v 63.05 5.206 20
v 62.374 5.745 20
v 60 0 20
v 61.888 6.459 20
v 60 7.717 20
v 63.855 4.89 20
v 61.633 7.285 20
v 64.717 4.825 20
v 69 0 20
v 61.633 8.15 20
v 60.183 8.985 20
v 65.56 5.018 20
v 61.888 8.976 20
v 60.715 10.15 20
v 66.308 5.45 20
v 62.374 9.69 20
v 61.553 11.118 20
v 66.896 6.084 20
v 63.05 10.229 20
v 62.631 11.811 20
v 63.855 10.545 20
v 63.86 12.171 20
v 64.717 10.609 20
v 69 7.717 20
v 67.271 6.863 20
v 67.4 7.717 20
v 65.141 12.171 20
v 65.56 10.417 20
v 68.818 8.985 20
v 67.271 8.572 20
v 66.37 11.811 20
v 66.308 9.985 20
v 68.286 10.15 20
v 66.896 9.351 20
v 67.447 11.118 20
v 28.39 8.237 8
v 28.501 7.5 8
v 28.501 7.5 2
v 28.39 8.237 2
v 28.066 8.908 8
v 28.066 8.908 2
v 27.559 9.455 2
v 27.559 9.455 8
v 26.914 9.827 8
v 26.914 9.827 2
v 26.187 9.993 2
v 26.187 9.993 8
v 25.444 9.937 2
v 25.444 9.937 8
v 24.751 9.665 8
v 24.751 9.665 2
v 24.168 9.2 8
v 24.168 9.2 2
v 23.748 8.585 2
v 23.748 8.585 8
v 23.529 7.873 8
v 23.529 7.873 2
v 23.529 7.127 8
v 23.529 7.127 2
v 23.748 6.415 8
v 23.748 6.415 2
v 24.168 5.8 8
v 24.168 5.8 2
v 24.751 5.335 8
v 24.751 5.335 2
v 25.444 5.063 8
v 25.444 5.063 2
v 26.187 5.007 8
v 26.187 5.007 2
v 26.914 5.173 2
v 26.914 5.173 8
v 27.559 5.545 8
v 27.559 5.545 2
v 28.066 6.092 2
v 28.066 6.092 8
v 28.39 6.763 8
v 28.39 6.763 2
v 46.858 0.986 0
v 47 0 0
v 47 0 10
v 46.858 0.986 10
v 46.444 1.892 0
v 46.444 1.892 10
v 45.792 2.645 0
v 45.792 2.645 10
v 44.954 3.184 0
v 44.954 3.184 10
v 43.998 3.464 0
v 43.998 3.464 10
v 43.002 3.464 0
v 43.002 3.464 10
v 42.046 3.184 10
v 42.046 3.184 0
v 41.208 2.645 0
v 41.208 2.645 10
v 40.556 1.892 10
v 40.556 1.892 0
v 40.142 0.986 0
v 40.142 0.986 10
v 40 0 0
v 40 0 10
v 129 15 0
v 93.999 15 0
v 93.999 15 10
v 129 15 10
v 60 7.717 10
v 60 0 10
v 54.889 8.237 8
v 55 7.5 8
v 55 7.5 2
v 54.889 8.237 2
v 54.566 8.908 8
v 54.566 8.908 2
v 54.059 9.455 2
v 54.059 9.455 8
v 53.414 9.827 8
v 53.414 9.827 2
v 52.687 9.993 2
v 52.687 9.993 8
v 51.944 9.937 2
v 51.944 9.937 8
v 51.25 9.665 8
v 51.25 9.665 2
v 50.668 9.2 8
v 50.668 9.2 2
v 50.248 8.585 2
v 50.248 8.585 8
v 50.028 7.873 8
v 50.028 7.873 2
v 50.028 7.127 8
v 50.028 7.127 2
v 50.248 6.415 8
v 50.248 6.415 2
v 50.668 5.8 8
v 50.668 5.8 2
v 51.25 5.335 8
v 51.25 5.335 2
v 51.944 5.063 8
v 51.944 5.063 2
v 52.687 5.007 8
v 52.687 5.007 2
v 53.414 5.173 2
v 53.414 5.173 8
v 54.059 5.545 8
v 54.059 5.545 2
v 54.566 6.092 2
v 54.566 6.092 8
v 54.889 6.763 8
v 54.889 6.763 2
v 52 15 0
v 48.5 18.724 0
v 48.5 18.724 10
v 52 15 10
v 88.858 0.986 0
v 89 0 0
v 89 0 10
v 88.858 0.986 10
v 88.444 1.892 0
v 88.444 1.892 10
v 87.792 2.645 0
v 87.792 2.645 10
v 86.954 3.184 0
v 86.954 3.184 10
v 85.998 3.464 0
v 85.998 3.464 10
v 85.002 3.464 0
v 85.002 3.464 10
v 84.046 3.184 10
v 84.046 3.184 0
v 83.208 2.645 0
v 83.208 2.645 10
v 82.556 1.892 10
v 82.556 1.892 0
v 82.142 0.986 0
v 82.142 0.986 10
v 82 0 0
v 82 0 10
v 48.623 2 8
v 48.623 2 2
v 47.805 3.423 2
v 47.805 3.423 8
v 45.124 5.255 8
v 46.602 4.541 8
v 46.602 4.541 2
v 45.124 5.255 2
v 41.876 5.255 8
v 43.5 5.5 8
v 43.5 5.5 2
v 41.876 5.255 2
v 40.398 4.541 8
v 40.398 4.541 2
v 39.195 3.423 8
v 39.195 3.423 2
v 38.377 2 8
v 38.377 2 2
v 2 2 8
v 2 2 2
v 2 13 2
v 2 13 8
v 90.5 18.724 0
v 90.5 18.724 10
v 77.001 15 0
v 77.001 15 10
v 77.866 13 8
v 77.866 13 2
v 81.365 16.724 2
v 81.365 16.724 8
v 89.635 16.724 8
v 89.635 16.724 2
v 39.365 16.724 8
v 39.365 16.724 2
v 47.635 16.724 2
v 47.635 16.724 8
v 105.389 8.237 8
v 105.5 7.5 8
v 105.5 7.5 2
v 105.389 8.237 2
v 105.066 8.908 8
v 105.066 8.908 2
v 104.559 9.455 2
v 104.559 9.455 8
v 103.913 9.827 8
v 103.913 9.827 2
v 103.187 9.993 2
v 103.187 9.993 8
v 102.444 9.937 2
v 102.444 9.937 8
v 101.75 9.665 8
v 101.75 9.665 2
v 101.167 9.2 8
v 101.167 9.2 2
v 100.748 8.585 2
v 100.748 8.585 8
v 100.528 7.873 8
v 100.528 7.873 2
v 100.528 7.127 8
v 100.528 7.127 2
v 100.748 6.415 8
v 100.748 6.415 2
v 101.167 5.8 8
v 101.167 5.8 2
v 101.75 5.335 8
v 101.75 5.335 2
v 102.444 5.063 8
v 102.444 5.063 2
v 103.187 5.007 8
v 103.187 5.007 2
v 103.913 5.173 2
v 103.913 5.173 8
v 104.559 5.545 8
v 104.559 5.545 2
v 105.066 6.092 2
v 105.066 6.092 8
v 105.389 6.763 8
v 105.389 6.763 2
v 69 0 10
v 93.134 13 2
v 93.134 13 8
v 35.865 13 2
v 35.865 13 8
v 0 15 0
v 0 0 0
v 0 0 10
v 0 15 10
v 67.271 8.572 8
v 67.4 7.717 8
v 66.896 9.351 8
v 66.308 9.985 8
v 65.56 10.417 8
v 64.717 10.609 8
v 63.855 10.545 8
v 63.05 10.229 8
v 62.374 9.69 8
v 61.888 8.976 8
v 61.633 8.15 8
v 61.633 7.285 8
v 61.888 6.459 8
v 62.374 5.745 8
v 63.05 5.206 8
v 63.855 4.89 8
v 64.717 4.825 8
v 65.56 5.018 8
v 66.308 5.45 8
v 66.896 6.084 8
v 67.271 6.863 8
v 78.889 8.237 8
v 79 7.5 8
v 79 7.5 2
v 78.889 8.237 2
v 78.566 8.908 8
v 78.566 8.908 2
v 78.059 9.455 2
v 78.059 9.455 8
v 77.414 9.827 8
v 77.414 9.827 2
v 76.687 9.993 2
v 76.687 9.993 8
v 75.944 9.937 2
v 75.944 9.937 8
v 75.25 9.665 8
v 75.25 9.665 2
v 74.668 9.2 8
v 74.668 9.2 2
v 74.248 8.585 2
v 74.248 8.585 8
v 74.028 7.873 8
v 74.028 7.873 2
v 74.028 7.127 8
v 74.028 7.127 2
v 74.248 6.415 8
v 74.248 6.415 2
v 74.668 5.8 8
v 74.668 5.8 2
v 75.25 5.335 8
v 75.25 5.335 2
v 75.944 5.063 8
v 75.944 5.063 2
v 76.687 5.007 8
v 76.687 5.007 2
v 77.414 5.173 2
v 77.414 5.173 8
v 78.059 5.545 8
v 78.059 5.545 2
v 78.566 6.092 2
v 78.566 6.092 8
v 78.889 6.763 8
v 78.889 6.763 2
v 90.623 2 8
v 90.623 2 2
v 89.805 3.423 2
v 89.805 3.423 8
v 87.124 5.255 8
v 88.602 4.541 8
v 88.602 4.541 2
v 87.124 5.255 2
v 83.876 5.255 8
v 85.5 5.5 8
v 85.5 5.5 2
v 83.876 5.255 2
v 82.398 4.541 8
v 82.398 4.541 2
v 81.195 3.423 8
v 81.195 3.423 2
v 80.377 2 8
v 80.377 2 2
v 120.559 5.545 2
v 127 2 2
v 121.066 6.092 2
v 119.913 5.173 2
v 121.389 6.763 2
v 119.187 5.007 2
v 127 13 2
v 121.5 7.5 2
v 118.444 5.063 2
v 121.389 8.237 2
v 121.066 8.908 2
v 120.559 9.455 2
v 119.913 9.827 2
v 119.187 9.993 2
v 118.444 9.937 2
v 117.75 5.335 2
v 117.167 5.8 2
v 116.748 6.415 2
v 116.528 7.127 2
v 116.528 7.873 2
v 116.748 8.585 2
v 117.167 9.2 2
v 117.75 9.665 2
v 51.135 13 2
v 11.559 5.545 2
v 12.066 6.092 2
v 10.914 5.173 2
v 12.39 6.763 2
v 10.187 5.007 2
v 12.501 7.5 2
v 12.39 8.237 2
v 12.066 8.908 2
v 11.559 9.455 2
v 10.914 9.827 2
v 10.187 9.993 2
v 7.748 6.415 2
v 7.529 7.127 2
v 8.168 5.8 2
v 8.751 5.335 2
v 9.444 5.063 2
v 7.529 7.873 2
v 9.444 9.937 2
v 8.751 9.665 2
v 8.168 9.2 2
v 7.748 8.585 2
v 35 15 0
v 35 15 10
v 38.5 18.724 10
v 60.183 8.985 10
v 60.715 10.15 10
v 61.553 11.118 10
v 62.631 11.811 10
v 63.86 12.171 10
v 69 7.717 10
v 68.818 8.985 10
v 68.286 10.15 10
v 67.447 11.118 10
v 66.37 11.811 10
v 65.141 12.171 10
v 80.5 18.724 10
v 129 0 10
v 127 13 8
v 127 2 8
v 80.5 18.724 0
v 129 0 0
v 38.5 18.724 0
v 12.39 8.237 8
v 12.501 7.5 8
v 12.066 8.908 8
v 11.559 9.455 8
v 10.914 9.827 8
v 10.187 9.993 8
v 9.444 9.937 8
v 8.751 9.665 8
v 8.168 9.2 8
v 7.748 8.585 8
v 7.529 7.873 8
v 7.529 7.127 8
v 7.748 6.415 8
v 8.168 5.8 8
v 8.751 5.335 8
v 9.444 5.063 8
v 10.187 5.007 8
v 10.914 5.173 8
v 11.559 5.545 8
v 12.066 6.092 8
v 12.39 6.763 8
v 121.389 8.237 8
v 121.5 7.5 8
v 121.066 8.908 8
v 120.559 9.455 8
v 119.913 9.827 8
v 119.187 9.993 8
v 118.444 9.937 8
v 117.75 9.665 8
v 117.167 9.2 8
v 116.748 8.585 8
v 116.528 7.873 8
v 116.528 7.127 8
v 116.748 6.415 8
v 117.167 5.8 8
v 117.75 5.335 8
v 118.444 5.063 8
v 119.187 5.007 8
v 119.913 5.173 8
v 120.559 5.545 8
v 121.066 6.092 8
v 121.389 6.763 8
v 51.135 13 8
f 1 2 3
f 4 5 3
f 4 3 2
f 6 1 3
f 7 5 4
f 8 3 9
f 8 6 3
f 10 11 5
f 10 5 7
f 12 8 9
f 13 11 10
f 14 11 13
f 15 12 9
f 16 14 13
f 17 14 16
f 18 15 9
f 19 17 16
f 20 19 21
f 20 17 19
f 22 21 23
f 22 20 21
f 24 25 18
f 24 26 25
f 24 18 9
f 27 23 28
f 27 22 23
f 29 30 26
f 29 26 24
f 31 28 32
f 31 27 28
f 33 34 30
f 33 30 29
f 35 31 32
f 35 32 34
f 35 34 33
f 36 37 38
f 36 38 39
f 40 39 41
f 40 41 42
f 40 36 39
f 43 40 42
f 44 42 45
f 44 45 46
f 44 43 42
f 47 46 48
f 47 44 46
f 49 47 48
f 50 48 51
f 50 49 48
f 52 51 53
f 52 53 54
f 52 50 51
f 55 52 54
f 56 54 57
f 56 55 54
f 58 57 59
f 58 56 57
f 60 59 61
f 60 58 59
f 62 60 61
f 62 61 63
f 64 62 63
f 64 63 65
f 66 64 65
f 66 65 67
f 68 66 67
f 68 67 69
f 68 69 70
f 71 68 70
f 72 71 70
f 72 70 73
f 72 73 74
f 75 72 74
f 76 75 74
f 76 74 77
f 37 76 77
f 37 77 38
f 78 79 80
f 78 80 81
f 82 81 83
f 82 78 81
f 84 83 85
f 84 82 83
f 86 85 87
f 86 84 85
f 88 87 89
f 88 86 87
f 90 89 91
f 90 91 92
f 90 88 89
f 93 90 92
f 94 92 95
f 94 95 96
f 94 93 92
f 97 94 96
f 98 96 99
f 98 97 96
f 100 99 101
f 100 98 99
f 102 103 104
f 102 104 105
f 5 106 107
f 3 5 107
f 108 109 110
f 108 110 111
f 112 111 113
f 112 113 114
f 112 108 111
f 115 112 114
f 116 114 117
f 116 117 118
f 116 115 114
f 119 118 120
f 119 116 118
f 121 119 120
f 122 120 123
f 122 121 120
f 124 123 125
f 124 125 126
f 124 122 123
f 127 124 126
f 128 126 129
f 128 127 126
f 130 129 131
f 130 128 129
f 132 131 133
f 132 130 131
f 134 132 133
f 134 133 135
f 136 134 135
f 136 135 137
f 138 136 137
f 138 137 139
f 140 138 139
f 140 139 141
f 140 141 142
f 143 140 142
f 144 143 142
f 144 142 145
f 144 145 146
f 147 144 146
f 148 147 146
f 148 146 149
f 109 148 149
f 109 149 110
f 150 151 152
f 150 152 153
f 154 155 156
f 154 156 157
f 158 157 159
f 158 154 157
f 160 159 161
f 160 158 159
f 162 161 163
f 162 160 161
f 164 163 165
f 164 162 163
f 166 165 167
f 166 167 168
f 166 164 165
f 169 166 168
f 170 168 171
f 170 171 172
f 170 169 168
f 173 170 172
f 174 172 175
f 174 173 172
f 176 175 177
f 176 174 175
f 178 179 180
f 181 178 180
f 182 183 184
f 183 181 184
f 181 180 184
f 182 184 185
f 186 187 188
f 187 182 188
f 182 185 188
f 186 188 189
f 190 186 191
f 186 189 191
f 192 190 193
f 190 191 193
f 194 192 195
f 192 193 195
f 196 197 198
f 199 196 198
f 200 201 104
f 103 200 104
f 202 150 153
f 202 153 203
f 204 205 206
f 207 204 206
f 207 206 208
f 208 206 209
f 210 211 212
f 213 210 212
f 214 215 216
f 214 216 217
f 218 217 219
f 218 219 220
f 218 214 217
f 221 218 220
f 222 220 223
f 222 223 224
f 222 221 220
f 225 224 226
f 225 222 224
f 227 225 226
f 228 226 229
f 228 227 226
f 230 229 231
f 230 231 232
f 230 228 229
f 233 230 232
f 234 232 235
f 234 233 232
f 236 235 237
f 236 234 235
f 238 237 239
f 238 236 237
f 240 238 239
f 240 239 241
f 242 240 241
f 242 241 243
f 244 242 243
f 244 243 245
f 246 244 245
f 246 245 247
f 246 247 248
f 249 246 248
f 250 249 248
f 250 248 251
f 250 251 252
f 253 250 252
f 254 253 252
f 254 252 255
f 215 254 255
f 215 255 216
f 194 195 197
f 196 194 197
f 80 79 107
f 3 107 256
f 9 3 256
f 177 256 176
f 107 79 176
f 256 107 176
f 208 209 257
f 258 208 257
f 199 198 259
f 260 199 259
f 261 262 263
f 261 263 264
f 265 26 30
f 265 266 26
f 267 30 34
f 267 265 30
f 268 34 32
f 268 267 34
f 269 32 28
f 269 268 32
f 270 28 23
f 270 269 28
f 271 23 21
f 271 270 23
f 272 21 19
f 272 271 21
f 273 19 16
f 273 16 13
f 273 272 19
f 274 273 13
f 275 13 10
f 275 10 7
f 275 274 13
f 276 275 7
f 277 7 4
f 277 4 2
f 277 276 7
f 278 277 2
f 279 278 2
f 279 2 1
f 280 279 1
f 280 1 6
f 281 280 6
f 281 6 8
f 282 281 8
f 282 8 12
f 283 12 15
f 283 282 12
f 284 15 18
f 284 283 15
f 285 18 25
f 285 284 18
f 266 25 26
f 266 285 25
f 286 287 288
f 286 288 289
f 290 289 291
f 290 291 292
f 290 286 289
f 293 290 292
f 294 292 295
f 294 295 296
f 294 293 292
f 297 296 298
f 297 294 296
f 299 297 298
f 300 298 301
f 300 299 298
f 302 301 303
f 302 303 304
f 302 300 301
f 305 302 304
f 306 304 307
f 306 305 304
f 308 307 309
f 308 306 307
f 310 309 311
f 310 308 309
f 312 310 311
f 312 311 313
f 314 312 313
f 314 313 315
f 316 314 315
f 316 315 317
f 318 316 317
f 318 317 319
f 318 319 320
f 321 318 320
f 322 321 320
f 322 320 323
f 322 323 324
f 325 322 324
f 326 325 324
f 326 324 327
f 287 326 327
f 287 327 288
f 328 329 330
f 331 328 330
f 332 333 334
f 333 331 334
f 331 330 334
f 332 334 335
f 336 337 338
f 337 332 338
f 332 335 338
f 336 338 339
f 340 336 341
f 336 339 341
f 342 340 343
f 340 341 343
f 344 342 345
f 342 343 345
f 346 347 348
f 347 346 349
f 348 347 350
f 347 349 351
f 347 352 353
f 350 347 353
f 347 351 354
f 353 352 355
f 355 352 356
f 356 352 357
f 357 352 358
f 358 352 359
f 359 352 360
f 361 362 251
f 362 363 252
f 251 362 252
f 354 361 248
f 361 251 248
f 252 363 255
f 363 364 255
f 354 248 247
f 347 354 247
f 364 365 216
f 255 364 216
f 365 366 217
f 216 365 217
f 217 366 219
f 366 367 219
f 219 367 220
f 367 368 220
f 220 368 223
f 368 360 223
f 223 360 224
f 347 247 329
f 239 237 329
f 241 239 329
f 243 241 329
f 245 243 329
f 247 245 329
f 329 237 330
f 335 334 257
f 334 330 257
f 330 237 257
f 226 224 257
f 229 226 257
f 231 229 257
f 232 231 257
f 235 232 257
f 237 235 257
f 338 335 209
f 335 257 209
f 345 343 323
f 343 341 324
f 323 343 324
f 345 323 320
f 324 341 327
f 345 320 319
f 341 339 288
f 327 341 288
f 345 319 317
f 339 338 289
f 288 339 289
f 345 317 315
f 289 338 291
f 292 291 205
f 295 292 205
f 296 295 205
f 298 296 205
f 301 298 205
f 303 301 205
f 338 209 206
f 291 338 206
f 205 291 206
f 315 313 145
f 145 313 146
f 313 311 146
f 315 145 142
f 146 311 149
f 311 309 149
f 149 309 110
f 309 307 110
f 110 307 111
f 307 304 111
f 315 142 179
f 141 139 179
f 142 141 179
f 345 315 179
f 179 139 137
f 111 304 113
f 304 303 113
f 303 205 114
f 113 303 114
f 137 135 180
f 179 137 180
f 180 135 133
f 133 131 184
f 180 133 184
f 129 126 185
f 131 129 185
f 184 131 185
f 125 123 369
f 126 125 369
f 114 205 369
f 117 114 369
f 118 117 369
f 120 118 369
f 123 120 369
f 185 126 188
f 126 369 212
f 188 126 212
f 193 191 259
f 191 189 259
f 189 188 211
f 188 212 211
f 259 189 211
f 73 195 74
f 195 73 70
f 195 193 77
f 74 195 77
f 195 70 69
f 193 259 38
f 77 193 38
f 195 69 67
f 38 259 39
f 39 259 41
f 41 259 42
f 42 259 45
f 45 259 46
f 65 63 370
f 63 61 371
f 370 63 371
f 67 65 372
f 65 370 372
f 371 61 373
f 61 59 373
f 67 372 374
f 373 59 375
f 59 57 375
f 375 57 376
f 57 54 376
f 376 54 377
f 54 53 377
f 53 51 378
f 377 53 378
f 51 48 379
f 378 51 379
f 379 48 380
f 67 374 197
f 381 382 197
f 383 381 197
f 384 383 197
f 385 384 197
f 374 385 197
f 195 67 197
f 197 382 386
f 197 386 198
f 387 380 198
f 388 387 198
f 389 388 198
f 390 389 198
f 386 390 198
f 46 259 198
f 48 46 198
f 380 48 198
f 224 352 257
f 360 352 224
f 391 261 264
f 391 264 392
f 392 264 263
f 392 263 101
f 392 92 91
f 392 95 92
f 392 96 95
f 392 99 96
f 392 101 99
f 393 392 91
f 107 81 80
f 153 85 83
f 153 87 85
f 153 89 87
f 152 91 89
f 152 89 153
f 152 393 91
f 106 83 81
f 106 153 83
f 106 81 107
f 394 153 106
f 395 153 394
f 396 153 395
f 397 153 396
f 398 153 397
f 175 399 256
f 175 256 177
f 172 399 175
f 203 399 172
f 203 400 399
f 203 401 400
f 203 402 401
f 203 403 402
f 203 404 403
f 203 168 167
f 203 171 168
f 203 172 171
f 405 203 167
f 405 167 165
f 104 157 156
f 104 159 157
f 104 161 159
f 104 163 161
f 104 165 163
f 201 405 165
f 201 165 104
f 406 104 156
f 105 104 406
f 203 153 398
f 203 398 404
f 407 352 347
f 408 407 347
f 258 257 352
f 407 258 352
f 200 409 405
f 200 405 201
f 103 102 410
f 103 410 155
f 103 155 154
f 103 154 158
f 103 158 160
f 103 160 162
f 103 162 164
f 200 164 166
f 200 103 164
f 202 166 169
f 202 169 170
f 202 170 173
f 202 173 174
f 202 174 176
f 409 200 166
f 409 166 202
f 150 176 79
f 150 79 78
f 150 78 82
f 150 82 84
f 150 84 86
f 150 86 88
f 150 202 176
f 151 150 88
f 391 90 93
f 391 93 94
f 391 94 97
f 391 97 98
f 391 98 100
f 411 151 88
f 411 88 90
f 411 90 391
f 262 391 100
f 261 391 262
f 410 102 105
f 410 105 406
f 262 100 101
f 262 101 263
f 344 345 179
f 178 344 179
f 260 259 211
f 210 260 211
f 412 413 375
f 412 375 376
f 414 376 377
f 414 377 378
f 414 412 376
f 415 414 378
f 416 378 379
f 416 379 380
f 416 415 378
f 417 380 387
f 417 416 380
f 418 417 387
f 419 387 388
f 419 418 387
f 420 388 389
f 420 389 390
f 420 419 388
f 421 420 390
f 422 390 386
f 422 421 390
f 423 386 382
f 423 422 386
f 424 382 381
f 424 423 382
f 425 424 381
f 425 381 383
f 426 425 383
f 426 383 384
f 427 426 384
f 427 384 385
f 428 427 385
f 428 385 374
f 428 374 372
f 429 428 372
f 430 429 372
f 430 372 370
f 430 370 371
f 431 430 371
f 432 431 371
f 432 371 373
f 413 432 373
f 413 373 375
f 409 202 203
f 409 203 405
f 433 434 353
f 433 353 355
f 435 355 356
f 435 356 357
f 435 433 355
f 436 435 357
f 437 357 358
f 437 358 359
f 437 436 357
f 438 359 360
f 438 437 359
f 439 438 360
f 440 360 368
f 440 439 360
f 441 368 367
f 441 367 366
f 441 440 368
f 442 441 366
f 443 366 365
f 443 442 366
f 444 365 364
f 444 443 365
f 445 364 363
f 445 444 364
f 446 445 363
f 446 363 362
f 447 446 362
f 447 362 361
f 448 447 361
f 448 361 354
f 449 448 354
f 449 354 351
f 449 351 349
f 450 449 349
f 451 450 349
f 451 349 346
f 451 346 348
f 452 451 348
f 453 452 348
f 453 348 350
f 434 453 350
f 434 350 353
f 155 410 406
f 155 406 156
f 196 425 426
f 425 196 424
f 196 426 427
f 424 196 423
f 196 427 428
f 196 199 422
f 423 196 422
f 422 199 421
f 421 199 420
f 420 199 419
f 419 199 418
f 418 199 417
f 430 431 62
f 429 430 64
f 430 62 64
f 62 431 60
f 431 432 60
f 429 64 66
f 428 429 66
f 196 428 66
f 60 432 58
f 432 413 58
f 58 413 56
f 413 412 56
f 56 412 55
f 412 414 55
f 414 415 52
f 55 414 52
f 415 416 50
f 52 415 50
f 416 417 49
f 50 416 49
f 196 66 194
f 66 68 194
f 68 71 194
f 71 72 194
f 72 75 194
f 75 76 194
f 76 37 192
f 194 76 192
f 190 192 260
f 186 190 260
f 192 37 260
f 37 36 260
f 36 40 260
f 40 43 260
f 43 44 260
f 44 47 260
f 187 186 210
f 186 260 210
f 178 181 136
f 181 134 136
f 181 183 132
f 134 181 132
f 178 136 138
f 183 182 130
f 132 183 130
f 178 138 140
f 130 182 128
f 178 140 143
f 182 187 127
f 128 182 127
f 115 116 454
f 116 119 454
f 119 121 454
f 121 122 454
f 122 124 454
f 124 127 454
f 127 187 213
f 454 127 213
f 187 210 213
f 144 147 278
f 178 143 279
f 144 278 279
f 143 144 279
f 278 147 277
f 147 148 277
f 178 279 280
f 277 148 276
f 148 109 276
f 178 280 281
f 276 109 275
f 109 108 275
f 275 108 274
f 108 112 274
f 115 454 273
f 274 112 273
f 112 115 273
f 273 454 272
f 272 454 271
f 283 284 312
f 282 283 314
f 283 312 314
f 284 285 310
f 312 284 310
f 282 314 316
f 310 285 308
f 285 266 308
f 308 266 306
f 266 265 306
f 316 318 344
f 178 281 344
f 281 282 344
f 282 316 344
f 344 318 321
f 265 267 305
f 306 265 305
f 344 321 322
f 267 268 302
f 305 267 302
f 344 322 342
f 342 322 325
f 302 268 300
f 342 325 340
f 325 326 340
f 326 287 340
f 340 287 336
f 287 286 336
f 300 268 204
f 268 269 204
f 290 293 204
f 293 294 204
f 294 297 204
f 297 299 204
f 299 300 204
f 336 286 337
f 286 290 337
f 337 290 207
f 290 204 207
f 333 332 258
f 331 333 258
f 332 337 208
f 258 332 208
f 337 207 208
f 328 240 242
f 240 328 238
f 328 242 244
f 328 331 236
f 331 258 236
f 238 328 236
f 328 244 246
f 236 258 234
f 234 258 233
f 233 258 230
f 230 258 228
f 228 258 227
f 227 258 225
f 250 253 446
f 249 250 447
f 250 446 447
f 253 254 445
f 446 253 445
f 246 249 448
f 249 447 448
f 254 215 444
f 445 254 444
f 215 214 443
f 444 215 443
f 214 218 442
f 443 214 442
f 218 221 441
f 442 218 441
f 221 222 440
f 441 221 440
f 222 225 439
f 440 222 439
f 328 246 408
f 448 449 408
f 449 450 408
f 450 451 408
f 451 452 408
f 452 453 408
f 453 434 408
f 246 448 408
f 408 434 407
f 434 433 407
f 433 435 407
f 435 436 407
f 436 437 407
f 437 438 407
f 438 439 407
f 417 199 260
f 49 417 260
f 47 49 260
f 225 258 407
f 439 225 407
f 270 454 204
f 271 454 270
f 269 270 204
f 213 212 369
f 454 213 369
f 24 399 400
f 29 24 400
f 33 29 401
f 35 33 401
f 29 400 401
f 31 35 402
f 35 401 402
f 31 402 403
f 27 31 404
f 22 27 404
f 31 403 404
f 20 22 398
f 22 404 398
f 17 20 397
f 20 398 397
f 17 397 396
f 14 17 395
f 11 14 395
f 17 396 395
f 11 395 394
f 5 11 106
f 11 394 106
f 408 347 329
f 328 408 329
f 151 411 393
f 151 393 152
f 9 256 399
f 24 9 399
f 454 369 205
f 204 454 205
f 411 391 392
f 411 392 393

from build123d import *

# Parameters (mm, degrees)
BOSS_EXTRUDE1_DEPTH = 10
BOSS_EXTRUDE2_START = -2
BOSS_EXTRUDE2_DEPTH = 2
BOSS_EXTRUDE3_DEPTH = 2
SKETCH6_R           = 4.5
SKETCH6_R_2         = 2.9
BOSS_EXTRUDE4_DEPTH = 10
CUT_EXTRUDE1_START  = -8
SKETCH7_R           = 2.9
CUT_EXTRUDE1_DEPTH  = 8
SKETCH9_R           = 2.5
BOSS_EXTRUDE5_DEPTH = 10
BOSS_EXTRUDE6_START = -10
BOSS_EXTRUDE6_DEPTH = 10


with BuildPart() as part:
    # Sketch1 → Boss-Extrude1 (new body)
    with BuildSketch(Plane.XY):
        with BuildLine():
            Line((0, 0), (0, 15))
            Line((0, 15), (35, 15))
            Line((35, 15), (38.5, 18.724245534))
            Line((38.5, 18.724245534), (48.5, 18.724245534))
            Line((48.5, 18.724245534), (52, 15))
            Line((52, 15), (77.000664221, 15))
            Line((77.000664221, 15), (80.5, 18.723808414))
            Line((80.5, 18.723808414), (85.5, 18.723808414))
            Line((85.5, 18.723808414), (90.5, 18.723808414))
            Line((90.5, 18.723808414), (93.999335779, 15))
            Line((93.999335779, 15), (129, 15))
            Line((129, 15), (129, 0))
            Line((129, 0), (89, 0))
            ThreePointArc((89, 0), (85.5, 3.5), (82, 0))
            Line((82, 0), (47, 0))
            ThreePointArc((47, 0), (43.5, 3.5), (40, 0))
            Line((40, 0), (0, 0))
        make_face()
        with BuildLine():
            Line((2, 13), (35.865019983, 13))
            Line((35.865019983, 13), (39.365019983, 16.724245534))
            Line((39.365019983, 16.724245534), (47.634980017, 16.724245534))
            Line((47.634980017, 16.724245534), (51.134980017, 13))
            Line((51.134980017, 13), (77.865727104, 13))
            Line((77.865727104, 13), (81.365062883, 16.723808414))
            Line((81.365062883, 16.723808414), (85.5, 16.723808414))
            Line((85.5, 16.723808414), (89.634937117, 16.723808414))
            Line((89.634937117, 16.723808414), (93.134272896, 13))
            Line((93.134272896, 13), (127, 13))
            Line((127, 13), (127, 2))
            Line((127, 2), (90.623475383, 2))
            ThreePointArc((90.623475383, 2), (85.5, 5.5), (80.376524617, 2))
            Line((80.376524617, 2), (48.623475383, 2))
            ThreePointArc((48.623475383, 2), (43.5, 5.5), (38.376524617, 2))
            Line((38.376524617, 2), (2, 2))
            Line((2, 2), (2, 13))
        make_face(mode=Mode.SUBTRACT)
    extrude(amount=BOSS_EXTRUDE1_DEPTH)

    # Sketch2 → Boss-Extrude2 (add)
    with BuildSketch(Plane.XY.offset(10).offset(BOSS_EXTRUDE2_START)):
        with BuildLine():
            Line((129, 0), (129, 15))
            Line((129, 15), (93.999335779, 15))
            Line((93.999335779, 15), (90.5, 18.723808414))
            Line((90.5, 18.723808414), (80.5, 18.723808414))
            Line((80.5, 18.723808414), (77.000664221, 15))
            Line((77.000664221, 15), (52, 15))
            Line((52, 15), (48.5, 18.724245534))
            Line((48.5, 18.724245534), (38.5, 18.724245534))
            Line((38.5, 18.724245534), (35, 15))
            Line((35, 15), (0, 15))
            Line((0, 15), (0, 0))
            Line((0, 0), (40, 0))
            ThreePointArc((40, 0), (43.5, 3.5), (47, 0))
            Line((47, 0), (82, 0))
            ThreePointArc((82, 0), (85.5, 3.5), (89, 0))
            Line((89, 0), (129, 0))
        make_face()
    extrude(amount=BOSS_EXTRUDE2_DEPTH)

    # Sketch3 → Boss-Extrude3 (add)
    with BuildSketch(Plane(origin=(0, 0, 0), x_dir=(-1, 0, 0), z_dir=(0, 0, -1))):
        with BuildLine():
            Line((-52, 15), (-77.000664221, 15))
            Line((-77.000664221, 15), (-80.5, 18.723808414))
            Line((-80.5, 18.723808414), (-90.5, 18.723808414))
            Line((-90.5, 18.723808414), (-93.999335779, 15))
            Line((-93.999335779, 15), (-129, 15))
            Line((-129, 15), (-129, 0))
            Line((-129, 0), (-89, 0))
            ThreePointArc((-89, 0), (-85.5, 3.5), (-82, 0))
            Line((-82, 0), (-47, 0))
            ThreePointArc((-47, 0), (-43.5, 3.5), (-40, 0))
            Line((-40, 0), (0, 0))
            Line((0, 0), (0, 15))
            Line((0, 15), (-35, 15))
            Line((-35, 15), (-38.5, 18.724245534))
            Line((-38.5, 18.724245534), (-48.5, 18.724245534))
            Line((-48.5, 18.724245534), (-52, 15))
        make_face()
    extrude(amount=-BOSS_EXTRUDE3_DEPTH)

    # Sketch6 → Boss-Extrude4 (add)
    with BuildSketch(Plane.XY.offset(10)):
        with Locations(Location((64.500332111, 7.717300047, 0), (0, 0, 180))):
            Circle(SKETCH6_R)
        with Locations((64.500332111, 7.717300047)):
            Circle(SKETCH6_R_2, mode=Mode.SUBTRACT)
    extrude(amount=BOSS_EXTRUDE4_DEPTH)

    # Sketch7 → Cut-Extrude1 (cut)
    with BuildSketch(Plane.XY.offset(10).offset(CUT_EXTRUDE1_START)):
        with Locations((64.500332111, 7.717300047)):
            Circle(SKETCH7_R)
    extrude(amount=CUT_EXTRUDE1_DEPTH, mode=Mode.SUBTRACT)

    # Sketch9 → Boss-Extrude5 (add)
    with BuildSketch(Plane.XY.offset(10)):
        with Locations((119, 7.5)):
            Circle(SKETCH9_R)
        with Locations((103, 7.5)):
            Circle(SKETCH9_R)
        with Locations((76.500332111, 7.5)):
            Circle(SKETCH9_R)
        with Locations((10.000664221, 7.5)):
            Circle(SKETCH9_R)
        with Locations((26.000664221, 7.5)):
            Circle(SKETCH9_R)
        with Locations((52.500332111, 7.5)):
            Circle(SKETCH9_R)
    extrude(amount=-BOSS_EXTRUDE5_DEPTH)

    # Sketch10 → Boss-Extrude6 (add)
    with BuildSketch(Plane.XY.offset(20).offset(BOSS_EXTRUDE6_START)):
        with BuildLine():
            Line((60.000332111, 7.717300047), (60.000332111, 0))
            Line((60.000332111, 0), (69.000332111, 0))
            Line((69.000332111, 0), (69.000332111, 7.717300047))
            ThreePointArc((69.000332111, 7.717300047), (64.500332111, 3.217300047), (60.000332111, 7.717300047))
        make_face()
    extrude(amount=BOSS_EXTRUDE6_DEPTH)


solid = part.part
